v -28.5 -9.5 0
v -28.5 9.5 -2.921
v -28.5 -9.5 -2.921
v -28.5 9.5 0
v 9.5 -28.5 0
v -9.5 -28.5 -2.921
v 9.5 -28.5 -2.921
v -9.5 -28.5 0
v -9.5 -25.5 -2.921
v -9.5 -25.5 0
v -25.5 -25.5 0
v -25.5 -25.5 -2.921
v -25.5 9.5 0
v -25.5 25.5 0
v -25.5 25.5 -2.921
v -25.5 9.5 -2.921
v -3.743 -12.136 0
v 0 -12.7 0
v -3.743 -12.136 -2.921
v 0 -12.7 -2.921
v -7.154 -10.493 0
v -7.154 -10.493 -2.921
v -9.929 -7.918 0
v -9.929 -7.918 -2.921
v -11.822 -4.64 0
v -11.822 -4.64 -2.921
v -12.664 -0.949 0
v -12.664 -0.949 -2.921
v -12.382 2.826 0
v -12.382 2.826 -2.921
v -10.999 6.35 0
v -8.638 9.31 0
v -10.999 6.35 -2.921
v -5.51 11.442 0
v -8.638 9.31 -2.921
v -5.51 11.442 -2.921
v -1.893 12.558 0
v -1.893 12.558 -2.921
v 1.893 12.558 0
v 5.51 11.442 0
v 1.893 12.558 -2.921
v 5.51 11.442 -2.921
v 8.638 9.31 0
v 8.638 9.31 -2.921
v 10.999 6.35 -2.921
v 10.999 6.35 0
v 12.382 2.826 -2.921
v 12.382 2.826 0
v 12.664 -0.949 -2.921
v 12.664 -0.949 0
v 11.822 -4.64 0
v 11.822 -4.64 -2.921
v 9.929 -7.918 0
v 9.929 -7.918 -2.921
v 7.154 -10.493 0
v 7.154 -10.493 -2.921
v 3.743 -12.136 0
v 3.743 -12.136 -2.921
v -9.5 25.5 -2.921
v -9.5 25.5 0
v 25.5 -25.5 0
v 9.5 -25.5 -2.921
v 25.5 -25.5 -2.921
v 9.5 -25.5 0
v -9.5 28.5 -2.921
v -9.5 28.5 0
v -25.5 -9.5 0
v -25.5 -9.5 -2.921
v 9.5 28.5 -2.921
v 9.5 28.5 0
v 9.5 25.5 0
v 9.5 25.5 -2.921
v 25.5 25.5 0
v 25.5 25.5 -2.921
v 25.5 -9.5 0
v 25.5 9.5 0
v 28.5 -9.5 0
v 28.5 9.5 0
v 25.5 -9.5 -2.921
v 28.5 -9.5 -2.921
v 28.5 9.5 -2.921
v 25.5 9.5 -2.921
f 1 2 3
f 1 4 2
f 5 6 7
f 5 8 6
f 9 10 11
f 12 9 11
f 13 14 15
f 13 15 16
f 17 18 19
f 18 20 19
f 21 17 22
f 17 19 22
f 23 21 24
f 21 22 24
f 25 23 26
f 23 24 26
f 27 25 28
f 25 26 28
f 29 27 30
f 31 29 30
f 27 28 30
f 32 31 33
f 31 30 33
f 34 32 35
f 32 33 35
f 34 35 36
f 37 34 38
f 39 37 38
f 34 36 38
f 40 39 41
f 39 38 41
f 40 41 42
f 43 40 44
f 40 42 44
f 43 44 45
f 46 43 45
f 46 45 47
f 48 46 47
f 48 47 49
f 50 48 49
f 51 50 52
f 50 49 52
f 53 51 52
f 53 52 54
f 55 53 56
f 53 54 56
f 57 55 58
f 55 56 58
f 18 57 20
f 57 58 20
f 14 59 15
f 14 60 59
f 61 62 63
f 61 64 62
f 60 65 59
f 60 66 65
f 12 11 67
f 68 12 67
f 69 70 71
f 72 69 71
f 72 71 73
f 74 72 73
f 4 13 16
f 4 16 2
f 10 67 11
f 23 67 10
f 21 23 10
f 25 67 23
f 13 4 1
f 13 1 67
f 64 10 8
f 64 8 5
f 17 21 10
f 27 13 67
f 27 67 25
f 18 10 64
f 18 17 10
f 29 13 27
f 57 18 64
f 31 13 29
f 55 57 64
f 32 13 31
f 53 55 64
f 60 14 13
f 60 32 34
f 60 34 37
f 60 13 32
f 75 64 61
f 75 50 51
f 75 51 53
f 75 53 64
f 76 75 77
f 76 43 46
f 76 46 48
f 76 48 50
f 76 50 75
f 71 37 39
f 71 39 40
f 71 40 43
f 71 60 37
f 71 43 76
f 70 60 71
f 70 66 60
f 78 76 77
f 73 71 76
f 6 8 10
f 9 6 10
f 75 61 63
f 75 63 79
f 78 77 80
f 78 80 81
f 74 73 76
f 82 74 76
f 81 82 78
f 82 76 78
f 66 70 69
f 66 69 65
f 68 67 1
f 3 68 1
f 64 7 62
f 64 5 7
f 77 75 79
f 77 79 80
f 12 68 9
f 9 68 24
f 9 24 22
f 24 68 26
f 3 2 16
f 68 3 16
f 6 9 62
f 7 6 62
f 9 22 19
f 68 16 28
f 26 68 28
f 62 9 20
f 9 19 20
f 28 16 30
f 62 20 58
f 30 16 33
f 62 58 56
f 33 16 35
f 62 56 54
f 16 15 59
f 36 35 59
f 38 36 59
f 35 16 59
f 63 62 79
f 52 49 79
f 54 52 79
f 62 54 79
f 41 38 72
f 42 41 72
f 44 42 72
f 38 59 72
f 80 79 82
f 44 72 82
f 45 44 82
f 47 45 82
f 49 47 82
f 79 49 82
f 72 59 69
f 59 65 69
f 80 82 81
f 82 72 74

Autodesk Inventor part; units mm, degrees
ref_plane "YZ Plane" through (0, 0, 0) normal (1, 0, 0) x (0, 1, 0)
ref_plane "XZ Plane" through (0, 0, 0) normal (0, 1, 0) x (-1, 0, 0)
ref_plane "XY Plane" through (0, 0, 0) normal (0, 0, 1) x (1, 0, 0)
sketch "Sketch1" plane through (0, 0, 0) normal (0, 0, 1) x (1, 0, 0)
  line L0 (-28.5, -28.5) -> (28.5, -28.5)
  line L1 (28.5, -28.5) -> (28.5, 28.5)
  line L2 (28.5, 28.5) -> (-28.5, 28.5)
  line L3 (-28.5, 28.5) -> (-28.5, -28.5)
  line L4 (-28.5, -28.5) -> (28.5, 28.5) construction
  line L5 (28.5, -28.5) -> (-28.5, 28.5) construction
  point P0 (0, 0)
  dimension "d0" = 57
  dimension "d1" = 57
extrude "Extrusion1" add sketch "Sketch1" against normal blind 2.921
sketch "Sketch2" plane through (0, 0, 0) normal (0, 0, 1) x (1, 0, 0)
  line L0 (-28.5, 28.5) -> (-9.5, 28.5)
  line L1 (-9.5, 28.5) -> (-9.5, 25.5)
  line L2 (-9.5, 25.5) -> (-25.5, 25.5)
  line L3 (-28.5, 22.4359) -> (-28.5, 28.5)
  line L4 (-28.5, 28.5) -> (-22.225, 28.5)
  line L5 (-25.5, 25.5) -> (-25.5, 9.5)
  line L6 (-25.5, 9.5) -> (-28.5, 9.5)
  line L7 (-28.5, 9.5) -> (-28.5, 28.5)
  line L8 (28.5, 28.5) -> (-28.5, 28.5) projected
  line L9 (-28.5, 28.5) -> (-28.5, -28.5) projected
  line L10 (0, 4.0972) -> (0, 8.5289)
  line L11 (-5.3828, 0) -> (-2.3228, 0)
  line L12 (28.5, 28.5) -> (9.5, 28.5)
  line L13 (9.5, 28.5) -> (9.5, 25.5)
  line L14 (9.5, 25.5) -> (25.5, 25.5)
  line L15 (28.5, 22.4359) -> (28.5, 28.5)
  line L16 (28.5, 28.5) -> (22.225, 28.5)
  line L17 (25.5, 25.5) -> (25.5, 9.5)
  line L18 (25.5, 9.5) -> (28.5, 9.5)
  line L19 (28.5, 9.5) -> (28.5, 28.5)
  line L20 (-28.5, -28.5) -> (-9.5, -28.5)
  line L21 (-9.5, -28.5) -> (-9.5, -25.5)
  line L22 (-9.5, -25.5) -> (-25.5, -25.5)
  line L23 (-28.5, -22.4359) -> (-28.5, -28.5)
  line L24 (-28.5, -28.5) -> (-22.225, -28.5)
  line L25 (-25.5, -25.5) -> (-25.5, -9.5)
  line L26 (-25.5, -9.5) -> (-28.5, -9.5)
  line L27 (-28.5, -9.5) -> (-28.5, -28.5)
  line L28 (28.5, -28.5) -> (-28.5, -28.5)
  line L29 (28.5, -28.5) -> (9.5, -28.5)
  line L30 (9.5, -28.5) -> (9.5, -25.5)
  line L31 (9.5, -25.5) -> (25.5, -25.5)
  line L32 (28.5, -22.4359) -> (28.5, -28.5)
  line L33 (28.5, -28.5) -> (22.225, -28.5)
  line L34 (25.5, -25.5) -> (25.5, -9.5)
  line L35 (25.5, -9.5) -> (28.5, -9.5)
  line L36 (28.5, -9.5) -> (28.5, -28.5)
  line L37 (-28.5, -28.5) -> (28.5, -28.5) projected
  line L38 (28.5, -28.5) -> (28.5, 28.5) projected
  point P0 (0, -8.5289)
  dimension "d59" = 3
  dimension "d62" = 3
  dimension "d65" = 19
  dimension "d66" = 19
  dimension "d67" = 19
  dimension "d68" = 19
  dimension "d69" = 19
  dimension "d70" = 19
  dimension "d71" = 19
  dimension "d72" = 19
  dimension "d73" = 19
  dimension "d74" = 19
  dimension "d75" = 19
  dimension "d76" = 19
extrude "Extrusion3" cut sketch "Sketch2" against normal up to next contours L0 L1 L2 L5 L6 L7 L3 | L8 L15 L19 L18 L17 L14 L13 | L26 L25 L22 L21 L20 L9 | L36 L32 L28 L30 L31 L34 L35
hole "Hole1" at (0, 0, 0) direction (0, 0, -1) diameter 25.4 end through all
equation "\"d1\" = d0"
equation "\"d62\" = d59"
equation "\"d68\" = d65"
equation "\"d70\" = d66"
equation "\"d23\" = 0.5 * d0"
equation "\"d53\" = 0.5 * d0"
properties part number "Top"
